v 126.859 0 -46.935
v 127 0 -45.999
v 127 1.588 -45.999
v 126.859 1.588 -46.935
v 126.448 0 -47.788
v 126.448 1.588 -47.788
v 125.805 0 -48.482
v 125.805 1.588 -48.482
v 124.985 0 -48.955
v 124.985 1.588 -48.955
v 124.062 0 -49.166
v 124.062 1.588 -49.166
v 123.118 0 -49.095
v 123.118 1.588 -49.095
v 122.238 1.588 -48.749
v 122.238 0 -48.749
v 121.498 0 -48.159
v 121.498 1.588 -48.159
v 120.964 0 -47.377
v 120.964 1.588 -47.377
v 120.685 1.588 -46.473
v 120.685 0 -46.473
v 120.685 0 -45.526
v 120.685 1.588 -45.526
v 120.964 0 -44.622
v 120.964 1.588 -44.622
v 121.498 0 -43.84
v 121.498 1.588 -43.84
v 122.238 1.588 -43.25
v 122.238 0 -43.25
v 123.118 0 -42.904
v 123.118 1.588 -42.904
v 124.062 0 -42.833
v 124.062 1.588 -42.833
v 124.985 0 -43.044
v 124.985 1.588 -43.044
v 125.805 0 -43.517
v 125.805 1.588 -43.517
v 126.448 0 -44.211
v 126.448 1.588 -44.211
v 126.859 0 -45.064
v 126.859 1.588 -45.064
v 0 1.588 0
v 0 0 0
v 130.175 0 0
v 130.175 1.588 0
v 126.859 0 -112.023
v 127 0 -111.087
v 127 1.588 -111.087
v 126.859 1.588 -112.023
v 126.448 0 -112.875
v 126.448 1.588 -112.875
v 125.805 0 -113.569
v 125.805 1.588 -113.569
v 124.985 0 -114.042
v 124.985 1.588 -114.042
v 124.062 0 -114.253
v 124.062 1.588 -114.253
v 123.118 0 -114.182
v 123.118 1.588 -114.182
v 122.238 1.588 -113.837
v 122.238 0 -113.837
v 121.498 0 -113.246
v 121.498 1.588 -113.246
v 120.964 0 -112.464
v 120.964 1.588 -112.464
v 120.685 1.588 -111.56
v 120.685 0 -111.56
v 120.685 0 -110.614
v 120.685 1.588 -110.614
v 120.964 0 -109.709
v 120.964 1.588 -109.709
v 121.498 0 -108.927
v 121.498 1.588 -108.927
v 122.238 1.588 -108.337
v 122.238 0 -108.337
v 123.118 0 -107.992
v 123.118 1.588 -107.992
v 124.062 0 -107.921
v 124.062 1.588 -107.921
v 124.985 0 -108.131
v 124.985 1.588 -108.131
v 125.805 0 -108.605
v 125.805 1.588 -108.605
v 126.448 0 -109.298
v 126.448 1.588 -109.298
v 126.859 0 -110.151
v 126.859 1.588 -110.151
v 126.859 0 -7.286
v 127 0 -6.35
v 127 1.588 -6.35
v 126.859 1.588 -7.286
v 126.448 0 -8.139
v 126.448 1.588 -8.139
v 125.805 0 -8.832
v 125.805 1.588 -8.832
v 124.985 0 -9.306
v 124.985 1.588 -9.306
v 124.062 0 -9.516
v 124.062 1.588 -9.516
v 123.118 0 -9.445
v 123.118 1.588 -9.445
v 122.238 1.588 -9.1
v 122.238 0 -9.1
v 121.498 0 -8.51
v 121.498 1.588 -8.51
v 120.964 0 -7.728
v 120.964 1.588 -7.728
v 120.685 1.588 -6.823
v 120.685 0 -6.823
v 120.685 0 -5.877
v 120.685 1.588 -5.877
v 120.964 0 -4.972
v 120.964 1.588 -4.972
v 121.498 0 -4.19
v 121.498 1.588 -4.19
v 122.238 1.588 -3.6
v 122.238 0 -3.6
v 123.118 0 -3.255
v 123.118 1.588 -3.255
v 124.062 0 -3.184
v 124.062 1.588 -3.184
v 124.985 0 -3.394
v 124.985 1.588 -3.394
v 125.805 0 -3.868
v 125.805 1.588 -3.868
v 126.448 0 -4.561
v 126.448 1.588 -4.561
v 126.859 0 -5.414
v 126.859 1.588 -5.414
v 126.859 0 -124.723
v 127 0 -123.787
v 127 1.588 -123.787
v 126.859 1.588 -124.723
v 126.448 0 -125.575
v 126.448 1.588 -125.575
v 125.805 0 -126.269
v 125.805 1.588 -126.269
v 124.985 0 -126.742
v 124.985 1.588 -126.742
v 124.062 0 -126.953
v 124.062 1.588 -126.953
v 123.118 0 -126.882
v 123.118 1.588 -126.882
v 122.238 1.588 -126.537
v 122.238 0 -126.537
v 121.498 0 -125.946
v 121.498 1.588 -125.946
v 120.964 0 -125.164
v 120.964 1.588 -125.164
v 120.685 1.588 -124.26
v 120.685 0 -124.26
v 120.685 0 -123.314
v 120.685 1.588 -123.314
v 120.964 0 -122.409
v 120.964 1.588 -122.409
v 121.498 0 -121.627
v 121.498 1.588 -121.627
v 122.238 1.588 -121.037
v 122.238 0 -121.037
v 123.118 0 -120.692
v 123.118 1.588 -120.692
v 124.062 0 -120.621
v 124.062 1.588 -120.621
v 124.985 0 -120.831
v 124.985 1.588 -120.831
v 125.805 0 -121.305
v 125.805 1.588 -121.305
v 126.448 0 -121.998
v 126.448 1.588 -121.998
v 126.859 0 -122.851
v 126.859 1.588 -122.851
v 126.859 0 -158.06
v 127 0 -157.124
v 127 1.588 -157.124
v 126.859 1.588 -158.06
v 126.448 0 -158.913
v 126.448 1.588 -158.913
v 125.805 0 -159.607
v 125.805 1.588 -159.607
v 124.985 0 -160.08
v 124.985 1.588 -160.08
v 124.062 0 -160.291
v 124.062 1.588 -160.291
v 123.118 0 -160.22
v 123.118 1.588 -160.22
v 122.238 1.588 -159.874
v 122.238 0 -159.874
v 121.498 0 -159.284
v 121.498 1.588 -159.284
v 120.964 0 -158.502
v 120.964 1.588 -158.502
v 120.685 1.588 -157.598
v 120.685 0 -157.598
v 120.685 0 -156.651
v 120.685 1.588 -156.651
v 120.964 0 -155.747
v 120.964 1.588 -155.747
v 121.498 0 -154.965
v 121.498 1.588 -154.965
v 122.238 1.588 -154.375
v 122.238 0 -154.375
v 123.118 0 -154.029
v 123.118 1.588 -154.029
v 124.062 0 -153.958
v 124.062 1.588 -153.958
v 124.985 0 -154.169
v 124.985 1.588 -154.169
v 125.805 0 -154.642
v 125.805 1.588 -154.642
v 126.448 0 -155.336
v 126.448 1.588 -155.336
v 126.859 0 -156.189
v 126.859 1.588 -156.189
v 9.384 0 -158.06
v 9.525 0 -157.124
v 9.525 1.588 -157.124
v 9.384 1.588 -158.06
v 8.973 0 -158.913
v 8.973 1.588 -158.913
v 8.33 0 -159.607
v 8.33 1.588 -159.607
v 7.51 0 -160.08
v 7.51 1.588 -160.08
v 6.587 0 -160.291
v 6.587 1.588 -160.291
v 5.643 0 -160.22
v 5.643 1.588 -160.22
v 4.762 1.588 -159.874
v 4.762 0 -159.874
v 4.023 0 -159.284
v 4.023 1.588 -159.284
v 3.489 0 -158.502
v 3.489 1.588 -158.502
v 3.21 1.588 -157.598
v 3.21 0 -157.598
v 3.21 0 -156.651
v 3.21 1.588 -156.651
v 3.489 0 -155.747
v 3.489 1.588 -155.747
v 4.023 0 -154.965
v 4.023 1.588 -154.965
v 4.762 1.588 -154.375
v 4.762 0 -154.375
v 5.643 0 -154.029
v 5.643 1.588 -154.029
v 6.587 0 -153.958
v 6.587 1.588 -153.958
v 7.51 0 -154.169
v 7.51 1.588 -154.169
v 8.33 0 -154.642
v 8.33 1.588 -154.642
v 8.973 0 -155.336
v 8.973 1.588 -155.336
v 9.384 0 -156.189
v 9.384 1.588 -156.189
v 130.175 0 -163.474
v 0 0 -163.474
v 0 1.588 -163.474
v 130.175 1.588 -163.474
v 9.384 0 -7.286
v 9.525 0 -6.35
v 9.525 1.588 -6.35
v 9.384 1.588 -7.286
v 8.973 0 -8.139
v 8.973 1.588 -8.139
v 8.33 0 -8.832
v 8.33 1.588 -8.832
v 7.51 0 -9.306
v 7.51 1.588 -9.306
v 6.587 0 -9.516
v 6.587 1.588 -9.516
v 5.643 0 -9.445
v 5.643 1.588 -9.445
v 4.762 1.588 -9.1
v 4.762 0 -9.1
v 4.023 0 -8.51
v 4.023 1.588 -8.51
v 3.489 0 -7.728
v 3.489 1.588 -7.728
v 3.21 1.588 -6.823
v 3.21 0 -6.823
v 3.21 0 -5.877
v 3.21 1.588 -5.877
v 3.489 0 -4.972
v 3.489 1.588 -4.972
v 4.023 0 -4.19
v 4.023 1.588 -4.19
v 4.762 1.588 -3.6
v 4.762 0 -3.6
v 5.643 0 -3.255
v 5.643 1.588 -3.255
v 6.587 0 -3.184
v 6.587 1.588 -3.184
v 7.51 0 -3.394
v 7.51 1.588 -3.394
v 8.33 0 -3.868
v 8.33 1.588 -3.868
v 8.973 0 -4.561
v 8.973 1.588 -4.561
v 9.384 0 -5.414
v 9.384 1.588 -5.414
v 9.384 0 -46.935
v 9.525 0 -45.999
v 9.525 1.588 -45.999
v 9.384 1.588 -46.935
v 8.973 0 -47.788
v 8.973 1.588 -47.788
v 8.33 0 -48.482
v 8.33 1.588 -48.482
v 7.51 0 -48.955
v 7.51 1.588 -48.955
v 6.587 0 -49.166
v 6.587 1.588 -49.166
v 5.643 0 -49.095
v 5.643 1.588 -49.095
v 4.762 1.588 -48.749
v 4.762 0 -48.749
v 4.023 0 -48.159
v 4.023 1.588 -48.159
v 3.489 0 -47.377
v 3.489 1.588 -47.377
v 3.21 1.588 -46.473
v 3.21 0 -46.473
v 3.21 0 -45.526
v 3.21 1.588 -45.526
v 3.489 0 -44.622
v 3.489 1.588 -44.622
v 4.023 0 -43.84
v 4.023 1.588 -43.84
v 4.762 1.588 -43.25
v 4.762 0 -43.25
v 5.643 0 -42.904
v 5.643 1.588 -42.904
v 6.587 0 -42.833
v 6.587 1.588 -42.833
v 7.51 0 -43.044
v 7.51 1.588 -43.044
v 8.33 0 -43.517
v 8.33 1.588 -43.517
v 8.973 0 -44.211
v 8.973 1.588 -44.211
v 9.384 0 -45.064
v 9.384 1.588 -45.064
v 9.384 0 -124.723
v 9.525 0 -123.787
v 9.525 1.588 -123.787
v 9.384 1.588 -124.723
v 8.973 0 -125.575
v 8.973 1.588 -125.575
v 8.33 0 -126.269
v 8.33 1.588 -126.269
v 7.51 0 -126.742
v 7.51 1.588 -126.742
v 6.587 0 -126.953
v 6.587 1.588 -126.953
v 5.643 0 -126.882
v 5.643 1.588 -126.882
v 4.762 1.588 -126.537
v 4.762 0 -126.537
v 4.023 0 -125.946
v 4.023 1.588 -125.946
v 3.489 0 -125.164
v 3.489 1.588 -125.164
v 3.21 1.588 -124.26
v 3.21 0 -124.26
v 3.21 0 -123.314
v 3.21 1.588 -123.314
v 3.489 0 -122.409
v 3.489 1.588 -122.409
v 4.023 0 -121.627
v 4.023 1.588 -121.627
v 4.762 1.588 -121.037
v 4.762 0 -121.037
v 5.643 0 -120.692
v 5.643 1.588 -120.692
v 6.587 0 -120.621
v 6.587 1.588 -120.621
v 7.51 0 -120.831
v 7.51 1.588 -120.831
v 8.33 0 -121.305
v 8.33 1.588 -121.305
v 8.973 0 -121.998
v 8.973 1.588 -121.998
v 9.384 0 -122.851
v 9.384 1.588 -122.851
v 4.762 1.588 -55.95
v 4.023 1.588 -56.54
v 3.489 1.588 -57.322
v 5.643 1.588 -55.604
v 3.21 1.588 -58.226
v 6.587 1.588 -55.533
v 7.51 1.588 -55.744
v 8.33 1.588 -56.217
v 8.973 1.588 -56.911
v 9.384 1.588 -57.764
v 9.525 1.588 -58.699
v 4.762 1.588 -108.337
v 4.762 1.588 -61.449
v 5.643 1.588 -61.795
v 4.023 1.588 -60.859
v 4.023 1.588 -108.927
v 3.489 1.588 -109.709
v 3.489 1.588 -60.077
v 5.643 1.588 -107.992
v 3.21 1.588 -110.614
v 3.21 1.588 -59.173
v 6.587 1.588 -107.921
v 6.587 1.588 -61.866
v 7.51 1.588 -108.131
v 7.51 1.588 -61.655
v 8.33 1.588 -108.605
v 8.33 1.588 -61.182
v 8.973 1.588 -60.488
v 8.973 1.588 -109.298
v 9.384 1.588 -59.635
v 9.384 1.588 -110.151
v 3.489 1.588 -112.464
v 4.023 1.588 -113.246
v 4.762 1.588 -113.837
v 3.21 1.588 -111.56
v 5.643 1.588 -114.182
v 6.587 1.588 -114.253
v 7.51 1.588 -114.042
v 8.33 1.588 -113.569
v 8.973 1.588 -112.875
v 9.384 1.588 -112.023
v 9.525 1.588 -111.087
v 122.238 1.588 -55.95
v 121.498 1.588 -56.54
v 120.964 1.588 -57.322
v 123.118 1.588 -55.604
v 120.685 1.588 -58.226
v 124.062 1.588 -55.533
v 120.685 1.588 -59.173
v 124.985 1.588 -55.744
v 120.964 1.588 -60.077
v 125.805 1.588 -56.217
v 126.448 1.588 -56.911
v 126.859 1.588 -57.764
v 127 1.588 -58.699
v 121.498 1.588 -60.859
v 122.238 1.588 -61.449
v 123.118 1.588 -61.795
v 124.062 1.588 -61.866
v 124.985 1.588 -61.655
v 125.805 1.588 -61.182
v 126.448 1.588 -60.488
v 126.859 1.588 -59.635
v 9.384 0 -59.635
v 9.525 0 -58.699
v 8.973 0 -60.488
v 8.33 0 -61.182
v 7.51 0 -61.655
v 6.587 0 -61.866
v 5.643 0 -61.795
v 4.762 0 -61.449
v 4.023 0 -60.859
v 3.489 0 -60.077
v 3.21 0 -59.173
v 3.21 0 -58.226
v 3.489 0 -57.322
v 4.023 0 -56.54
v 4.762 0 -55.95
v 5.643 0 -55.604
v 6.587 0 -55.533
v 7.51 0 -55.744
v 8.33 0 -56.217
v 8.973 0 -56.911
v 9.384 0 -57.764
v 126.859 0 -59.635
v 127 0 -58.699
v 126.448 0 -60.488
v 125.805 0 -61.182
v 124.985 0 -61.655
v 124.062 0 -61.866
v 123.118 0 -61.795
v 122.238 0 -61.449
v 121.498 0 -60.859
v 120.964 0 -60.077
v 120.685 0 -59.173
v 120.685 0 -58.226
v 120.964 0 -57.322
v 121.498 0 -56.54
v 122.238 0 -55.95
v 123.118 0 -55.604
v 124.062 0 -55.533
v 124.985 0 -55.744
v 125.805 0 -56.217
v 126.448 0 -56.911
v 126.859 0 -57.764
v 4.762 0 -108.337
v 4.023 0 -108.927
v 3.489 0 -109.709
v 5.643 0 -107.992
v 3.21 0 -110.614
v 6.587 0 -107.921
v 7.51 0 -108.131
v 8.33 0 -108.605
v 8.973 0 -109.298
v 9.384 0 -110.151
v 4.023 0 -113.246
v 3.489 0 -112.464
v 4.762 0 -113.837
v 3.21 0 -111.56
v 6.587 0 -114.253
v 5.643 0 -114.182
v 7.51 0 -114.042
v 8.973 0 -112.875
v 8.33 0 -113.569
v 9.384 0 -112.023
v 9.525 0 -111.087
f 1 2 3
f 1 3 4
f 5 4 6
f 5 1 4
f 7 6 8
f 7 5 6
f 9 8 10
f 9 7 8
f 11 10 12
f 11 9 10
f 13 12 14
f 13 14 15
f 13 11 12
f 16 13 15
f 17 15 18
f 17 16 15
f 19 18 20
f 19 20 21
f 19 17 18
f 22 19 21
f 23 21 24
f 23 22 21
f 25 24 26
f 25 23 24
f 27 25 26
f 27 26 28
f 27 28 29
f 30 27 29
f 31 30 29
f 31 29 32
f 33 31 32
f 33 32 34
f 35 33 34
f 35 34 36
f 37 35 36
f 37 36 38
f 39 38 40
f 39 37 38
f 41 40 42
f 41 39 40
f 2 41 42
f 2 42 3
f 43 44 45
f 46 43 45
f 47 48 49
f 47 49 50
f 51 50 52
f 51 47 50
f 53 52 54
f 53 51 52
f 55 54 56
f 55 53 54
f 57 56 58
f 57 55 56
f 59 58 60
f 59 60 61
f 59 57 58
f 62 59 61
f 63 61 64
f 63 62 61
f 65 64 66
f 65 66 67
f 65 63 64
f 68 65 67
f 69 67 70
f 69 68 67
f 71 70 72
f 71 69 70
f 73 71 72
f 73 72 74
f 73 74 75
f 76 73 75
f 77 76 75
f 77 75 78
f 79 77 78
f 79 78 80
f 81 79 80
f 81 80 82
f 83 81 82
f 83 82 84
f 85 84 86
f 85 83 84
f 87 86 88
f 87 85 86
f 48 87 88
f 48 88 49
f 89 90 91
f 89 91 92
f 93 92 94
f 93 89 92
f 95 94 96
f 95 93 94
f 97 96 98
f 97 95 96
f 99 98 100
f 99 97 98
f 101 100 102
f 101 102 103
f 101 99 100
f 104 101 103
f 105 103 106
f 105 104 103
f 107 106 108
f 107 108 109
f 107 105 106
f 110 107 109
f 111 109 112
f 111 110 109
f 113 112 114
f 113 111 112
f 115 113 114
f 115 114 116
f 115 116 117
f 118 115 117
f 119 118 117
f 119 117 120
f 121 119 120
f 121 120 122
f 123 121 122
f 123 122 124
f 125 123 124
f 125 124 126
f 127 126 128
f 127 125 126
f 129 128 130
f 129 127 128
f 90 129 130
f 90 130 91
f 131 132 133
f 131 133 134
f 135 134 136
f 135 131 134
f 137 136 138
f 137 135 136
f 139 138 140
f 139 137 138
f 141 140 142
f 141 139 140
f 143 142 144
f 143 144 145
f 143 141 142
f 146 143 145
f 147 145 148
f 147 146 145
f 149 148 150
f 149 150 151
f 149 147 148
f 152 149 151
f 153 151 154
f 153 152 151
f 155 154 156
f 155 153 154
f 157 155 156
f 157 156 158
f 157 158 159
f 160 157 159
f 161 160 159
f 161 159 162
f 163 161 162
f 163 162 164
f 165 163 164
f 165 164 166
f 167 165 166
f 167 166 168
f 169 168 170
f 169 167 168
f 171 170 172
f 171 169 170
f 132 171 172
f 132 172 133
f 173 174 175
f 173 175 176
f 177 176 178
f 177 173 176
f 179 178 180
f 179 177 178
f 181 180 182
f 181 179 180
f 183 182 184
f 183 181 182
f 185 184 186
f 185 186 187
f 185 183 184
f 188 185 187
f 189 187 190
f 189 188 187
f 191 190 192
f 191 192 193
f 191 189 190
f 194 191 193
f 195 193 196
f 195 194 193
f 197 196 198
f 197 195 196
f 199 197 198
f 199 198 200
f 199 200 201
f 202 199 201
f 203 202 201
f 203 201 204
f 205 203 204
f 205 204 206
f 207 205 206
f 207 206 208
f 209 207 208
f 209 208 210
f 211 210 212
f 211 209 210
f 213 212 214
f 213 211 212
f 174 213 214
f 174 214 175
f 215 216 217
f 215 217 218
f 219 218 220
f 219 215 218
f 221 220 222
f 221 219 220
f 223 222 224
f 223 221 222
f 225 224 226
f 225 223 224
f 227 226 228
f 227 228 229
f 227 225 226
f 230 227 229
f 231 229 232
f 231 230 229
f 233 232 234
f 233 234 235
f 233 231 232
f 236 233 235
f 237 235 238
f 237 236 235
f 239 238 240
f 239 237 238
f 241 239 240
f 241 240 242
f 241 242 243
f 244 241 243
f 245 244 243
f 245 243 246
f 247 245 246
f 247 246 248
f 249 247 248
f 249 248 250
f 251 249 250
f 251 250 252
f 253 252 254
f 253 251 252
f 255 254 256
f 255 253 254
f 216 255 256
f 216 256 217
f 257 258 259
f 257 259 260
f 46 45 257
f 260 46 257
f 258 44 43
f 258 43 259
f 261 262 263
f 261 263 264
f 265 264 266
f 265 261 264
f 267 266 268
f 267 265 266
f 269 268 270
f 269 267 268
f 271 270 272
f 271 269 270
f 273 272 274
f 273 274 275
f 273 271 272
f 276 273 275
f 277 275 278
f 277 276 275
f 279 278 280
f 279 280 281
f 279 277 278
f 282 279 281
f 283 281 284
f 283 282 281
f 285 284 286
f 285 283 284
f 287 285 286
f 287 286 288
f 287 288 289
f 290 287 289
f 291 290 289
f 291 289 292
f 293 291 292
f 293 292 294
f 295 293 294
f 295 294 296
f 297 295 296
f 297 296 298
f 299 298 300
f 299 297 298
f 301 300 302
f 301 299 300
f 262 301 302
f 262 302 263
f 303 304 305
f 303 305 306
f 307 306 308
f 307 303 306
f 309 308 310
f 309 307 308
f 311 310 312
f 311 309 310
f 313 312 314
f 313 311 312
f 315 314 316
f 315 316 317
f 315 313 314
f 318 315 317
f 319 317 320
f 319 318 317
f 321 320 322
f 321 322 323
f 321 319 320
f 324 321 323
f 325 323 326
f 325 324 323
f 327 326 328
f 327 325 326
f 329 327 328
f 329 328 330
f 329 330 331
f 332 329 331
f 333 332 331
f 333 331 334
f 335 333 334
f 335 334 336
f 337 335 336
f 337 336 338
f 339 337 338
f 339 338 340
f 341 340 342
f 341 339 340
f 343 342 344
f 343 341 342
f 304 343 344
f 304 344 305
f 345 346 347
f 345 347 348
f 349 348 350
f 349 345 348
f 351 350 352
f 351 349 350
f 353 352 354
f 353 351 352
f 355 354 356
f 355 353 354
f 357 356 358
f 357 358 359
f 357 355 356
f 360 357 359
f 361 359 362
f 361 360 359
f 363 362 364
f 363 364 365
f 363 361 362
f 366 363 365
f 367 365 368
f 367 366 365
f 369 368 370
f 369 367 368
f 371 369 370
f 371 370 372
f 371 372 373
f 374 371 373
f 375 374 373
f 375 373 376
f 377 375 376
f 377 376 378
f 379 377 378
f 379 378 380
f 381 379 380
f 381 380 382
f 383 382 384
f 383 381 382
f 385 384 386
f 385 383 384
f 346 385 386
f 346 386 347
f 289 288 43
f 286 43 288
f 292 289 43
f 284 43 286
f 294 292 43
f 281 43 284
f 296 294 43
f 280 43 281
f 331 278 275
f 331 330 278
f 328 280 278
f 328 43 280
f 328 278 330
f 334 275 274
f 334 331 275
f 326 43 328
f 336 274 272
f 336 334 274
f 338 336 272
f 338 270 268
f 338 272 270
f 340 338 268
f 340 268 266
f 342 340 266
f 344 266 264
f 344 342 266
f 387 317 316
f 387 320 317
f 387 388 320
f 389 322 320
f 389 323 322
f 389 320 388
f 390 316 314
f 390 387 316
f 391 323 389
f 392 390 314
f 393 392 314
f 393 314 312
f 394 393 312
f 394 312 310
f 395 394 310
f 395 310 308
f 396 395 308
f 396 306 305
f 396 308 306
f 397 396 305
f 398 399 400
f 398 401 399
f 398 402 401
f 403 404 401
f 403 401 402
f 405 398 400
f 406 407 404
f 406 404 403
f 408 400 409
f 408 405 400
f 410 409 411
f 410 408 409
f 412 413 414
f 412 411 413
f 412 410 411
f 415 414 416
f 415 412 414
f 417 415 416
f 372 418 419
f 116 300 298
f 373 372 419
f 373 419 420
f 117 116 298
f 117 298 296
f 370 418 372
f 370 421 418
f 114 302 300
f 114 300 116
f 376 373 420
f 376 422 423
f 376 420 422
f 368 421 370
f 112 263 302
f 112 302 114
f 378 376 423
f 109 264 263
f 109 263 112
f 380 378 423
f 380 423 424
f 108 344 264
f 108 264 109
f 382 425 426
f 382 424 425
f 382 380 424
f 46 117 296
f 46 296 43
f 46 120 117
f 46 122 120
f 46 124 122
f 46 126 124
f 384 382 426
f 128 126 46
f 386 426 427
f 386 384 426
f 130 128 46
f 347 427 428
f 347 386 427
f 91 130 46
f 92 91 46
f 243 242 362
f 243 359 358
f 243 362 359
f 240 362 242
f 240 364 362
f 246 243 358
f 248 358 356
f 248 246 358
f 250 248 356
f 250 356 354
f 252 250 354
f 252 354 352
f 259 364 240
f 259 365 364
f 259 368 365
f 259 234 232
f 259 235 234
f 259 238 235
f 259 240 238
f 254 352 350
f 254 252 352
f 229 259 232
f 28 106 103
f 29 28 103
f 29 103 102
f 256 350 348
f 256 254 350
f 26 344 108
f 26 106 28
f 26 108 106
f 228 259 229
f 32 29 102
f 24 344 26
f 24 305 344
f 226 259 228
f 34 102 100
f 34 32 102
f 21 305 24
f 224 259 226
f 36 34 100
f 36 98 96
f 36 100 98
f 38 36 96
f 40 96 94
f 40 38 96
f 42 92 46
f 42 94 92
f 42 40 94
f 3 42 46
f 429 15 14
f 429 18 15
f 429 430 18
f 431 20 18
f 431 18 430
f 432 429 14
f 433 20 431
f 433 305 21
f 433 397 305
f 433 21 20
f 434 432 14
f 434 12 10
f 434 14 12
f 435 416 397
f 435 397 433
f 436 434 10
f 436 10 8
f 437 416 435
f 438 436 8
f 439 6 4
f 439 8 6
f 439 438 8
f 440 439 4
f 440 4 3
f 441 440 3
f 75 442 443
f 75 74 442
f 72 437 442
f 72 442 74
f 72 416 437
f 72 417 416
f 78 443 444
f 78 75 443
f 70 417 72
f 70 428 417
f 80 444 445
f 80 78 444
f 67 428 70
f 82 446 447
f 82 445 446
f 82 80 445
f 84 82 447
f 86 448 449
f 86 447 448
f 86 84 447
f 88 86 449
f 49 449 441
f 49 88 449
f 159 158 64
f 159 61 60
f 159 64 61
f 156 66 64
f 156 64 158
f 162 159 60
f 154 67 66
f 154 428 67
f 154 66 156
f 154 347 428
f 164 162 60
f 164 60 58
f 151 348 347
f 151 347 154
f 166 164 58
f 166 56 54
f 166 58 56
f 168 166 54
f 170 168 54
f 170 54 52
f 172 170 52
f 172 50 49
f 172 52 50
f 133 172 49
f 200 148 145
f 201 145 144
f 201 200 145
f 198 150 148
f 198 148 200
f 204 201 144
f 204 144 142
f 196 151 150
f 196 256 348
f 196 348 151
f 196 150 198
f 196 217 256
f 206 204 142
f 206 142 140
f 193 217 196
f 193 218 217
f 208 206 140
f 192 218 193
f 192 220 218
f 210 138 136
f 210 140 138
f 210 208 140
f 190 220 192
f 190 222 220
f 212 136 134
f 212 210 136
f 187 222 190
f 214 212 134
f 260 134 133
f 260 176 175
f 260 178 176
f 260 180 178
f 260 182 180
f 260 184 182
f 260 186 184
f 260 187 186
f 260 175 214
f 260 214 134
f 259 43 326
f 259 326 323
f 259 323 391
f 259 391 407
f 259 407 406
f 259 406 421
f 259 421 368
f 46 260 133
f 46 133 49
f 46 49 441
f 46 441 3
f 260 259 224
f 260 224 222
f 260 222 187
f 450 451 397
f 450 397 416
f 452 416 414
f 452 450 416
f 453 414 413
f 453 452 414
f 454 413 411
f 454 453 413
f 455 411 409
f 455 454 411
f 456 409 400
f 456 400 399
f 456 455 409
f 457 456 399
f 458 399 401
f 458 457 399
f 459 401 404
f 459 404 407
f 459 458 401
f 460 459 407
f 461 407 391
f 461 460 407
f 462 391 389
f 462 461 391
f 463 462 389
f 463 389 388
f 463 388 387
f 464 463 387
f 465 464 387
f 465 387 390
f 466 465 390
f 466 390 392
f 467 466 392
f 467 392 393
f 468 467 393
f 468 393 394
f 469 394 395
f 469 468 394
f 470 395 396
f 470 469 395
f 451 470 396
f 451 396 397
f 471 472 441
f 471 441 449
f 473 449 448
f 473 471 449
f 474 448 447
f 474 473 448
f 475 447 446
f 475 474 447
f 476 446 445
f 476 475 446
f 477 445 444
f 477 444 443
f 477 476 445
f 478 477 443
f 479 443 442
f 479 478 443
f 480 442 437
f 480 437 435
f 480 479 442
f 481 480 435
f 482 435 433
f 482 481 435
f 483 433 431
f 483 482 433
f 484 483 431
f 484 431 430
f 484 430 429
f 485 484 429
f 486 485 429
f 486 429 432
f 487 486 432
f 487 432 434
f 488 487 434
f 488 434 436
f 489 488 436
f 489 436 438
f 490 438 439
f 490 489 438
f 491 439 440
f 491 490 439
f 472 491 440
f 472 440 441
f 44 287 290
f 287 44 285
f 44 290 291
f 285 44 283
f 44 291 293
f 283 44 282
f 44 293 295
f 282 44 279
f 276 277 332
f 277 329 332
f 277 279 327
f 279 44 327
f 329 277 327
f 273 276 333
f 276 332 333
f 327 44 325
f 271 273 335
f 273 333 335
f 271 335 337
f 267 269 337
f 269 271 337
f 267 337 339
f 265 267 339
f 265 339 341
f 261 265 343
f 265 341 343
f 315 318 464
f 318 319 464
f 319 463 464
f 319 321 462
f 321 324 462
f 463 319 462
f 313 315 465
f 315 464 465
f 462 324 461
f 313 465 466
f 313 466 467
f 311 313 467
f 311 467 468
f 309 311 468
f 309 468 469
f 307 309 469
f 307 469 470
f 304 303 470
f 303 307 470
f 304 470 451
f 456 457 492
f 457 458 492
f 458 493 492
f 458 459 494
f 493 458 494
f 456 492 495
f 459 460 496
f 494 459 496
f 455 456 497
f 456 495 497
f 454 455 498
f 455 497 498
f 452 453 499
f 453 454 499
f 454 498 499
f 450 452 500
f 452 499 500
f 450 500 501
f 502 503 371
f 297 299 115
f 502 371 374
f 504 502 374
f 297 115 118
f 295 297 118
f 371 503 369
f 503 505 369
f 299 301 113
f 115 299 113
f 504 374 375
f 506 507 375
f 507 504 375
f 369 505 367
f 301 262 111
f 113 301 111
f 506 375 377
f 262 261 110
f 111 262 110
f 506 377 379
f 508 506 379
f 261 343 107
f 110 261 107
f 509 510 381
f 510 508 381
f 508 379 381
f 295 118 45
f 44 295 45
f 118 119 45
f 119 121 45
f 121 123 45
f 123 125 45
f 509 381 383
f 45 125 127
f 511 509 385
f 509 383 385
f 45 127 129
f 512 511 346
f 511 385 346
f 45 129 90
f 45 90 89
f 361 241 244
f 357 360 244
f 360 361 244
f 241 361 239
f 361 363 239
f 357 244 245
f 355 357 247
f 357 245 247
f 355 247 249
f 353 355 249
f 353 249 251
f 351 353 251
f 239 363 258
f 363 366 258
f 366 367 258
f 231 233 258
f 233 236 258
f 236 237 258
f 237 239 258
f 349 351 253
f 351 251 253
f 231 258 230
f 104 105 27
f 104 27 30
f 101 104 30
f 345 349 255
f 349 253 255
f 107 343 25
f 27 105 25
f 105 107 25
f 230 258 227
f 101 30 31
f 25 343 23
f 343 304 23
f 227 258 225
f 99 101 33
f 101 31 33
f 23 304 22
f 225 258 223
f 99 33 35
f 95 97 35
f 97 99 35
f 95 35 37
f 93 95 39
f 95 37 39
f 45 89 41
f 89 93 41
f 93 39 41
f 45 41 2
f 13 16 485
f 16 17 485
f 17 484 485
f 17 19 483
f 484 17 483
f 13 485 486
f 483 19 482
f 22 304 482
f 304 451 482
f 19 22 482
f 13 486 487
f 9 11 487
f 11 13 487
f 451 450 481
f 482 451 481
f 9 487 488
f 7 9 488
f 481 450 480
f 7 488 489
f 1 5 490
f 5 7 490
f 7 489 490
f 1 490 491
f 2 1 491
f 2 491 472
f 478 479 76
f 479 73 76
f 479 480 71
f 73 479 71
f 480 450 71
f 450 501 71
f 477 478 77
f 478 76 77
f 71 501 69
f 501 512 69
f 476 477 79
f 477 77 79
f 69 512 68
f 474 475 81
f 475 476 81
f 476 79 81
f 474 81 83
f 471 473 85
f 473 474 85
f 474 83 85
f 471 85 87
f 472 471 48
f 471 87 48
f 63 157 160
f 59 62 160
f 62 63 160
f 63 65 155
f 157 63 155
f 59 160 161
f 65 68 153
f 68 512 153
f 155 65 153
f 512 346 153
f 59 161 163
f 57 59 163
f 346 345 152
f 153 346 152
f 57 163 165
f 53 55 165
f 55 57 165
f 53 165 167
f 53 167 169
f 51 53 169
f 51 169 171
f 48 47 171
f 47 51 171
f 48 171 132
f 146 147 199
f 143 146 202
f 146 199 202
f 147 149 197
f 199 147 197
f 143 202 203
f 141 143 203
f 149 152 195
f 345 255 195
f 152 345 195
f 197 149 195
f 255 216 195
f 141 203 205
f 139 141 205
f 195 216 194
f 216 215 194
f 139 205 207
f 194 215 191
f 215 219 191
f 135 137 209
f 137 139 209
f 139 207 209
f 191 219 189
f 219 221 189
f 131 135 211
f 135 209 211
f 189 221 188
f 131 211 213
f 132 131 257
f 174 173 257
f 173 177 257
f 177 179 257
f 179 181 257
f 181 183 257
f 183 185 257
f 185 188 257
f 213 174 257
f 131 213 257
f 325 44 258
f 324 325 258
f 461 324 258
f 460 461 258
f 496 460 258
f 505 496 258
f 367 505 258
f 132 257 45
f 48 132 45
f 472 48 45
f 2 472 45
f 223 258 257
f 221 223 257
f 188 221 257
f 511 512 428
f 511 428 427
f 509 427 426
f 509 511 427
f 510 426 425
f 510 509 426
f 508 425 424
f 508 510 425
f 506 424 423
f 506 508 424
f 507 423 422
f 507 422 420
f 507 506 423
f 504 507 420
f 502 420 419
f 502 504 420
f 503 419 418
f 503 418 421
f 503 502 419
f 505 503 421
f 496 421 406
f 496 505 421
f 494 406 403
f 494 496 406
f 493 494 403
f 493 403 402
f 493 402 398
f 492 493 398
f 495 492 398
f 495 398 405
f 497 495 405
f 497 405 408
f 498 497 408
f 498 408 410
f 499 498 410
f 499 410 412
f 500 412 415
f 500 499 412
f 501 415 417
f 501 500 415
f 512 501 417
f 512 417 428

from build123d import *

# Parameters (mm, degrees)
SKETCH1_W           = 130.175
SKETCH1_H           = 163.4744
SKETCH1_R           = 3.175
BOSS_EXTRUDE1_DEPTH = 1.5875


with BuildPart() as part:
    # Sketch1 → Boss-Extrude1 (new body)
    with BuildSketch(Plane(origin=(0, 0, 0), x_dir=(1, 0, 0), z_dir=(0, 1, 0))):
        with Locations((65.0875, 81.7372)):
            Rectangle(SKETCH1_W, SKETCH1_H)
        with Locations((6.35, 6.35)):
            Circle(SKETCH1_R, mode=Mode.SUBTRACT)
        with Locations((6.35, 157.1244)):
            Circle(SKETCH1_R, mode=Mode.SUBTRACT)
        with Locations((123.825, 6.35)):
            Circle(SKETCH1_R, mode=Mode.SUBTRACT)
        with Locations((123.825, 157.1244)):
            Circle(SKETCH1_R, mode=Mode.SUBTRACT)
        with Locations((6.35, 123.7869)):
            Circle(SKETCH1_R, mode=Mode.SUBTRACT)
        with Locations((6.35, 111.0869)):
            Circle(SKETCH1_R, mode=Mode.SUBTRACT)
        with Locations((6.35, 58.6994)):
            Circle(SKETCH1_R, mode=Mode.SUBTRACT)
        with Locations((6.35, 45.9994)):
            Circle(SKETCH1_R, mode=Mode.SUBTRACT)
        with Locations((123.825, 123.7869)):
            Circle(SKETCH1_R, mode=Mode.SUBTRACT)
        with Locations((123.825, 111.0869)):
            Circle(SKETCH1_R, mode=Mode.SUBTRACT)
        with Locations((123.825, 58.6994)):
            Circle(SKETCH1_R, mode=Mode.SUBTRACT)
        with Locations((123.825, 45.9994)):
            Circle(SKETCH1_R, mode=Mode.SUBTRACT)
    extrude(amount=BOSS_EXTRUDE1_DEPTH)


solid = part.part
